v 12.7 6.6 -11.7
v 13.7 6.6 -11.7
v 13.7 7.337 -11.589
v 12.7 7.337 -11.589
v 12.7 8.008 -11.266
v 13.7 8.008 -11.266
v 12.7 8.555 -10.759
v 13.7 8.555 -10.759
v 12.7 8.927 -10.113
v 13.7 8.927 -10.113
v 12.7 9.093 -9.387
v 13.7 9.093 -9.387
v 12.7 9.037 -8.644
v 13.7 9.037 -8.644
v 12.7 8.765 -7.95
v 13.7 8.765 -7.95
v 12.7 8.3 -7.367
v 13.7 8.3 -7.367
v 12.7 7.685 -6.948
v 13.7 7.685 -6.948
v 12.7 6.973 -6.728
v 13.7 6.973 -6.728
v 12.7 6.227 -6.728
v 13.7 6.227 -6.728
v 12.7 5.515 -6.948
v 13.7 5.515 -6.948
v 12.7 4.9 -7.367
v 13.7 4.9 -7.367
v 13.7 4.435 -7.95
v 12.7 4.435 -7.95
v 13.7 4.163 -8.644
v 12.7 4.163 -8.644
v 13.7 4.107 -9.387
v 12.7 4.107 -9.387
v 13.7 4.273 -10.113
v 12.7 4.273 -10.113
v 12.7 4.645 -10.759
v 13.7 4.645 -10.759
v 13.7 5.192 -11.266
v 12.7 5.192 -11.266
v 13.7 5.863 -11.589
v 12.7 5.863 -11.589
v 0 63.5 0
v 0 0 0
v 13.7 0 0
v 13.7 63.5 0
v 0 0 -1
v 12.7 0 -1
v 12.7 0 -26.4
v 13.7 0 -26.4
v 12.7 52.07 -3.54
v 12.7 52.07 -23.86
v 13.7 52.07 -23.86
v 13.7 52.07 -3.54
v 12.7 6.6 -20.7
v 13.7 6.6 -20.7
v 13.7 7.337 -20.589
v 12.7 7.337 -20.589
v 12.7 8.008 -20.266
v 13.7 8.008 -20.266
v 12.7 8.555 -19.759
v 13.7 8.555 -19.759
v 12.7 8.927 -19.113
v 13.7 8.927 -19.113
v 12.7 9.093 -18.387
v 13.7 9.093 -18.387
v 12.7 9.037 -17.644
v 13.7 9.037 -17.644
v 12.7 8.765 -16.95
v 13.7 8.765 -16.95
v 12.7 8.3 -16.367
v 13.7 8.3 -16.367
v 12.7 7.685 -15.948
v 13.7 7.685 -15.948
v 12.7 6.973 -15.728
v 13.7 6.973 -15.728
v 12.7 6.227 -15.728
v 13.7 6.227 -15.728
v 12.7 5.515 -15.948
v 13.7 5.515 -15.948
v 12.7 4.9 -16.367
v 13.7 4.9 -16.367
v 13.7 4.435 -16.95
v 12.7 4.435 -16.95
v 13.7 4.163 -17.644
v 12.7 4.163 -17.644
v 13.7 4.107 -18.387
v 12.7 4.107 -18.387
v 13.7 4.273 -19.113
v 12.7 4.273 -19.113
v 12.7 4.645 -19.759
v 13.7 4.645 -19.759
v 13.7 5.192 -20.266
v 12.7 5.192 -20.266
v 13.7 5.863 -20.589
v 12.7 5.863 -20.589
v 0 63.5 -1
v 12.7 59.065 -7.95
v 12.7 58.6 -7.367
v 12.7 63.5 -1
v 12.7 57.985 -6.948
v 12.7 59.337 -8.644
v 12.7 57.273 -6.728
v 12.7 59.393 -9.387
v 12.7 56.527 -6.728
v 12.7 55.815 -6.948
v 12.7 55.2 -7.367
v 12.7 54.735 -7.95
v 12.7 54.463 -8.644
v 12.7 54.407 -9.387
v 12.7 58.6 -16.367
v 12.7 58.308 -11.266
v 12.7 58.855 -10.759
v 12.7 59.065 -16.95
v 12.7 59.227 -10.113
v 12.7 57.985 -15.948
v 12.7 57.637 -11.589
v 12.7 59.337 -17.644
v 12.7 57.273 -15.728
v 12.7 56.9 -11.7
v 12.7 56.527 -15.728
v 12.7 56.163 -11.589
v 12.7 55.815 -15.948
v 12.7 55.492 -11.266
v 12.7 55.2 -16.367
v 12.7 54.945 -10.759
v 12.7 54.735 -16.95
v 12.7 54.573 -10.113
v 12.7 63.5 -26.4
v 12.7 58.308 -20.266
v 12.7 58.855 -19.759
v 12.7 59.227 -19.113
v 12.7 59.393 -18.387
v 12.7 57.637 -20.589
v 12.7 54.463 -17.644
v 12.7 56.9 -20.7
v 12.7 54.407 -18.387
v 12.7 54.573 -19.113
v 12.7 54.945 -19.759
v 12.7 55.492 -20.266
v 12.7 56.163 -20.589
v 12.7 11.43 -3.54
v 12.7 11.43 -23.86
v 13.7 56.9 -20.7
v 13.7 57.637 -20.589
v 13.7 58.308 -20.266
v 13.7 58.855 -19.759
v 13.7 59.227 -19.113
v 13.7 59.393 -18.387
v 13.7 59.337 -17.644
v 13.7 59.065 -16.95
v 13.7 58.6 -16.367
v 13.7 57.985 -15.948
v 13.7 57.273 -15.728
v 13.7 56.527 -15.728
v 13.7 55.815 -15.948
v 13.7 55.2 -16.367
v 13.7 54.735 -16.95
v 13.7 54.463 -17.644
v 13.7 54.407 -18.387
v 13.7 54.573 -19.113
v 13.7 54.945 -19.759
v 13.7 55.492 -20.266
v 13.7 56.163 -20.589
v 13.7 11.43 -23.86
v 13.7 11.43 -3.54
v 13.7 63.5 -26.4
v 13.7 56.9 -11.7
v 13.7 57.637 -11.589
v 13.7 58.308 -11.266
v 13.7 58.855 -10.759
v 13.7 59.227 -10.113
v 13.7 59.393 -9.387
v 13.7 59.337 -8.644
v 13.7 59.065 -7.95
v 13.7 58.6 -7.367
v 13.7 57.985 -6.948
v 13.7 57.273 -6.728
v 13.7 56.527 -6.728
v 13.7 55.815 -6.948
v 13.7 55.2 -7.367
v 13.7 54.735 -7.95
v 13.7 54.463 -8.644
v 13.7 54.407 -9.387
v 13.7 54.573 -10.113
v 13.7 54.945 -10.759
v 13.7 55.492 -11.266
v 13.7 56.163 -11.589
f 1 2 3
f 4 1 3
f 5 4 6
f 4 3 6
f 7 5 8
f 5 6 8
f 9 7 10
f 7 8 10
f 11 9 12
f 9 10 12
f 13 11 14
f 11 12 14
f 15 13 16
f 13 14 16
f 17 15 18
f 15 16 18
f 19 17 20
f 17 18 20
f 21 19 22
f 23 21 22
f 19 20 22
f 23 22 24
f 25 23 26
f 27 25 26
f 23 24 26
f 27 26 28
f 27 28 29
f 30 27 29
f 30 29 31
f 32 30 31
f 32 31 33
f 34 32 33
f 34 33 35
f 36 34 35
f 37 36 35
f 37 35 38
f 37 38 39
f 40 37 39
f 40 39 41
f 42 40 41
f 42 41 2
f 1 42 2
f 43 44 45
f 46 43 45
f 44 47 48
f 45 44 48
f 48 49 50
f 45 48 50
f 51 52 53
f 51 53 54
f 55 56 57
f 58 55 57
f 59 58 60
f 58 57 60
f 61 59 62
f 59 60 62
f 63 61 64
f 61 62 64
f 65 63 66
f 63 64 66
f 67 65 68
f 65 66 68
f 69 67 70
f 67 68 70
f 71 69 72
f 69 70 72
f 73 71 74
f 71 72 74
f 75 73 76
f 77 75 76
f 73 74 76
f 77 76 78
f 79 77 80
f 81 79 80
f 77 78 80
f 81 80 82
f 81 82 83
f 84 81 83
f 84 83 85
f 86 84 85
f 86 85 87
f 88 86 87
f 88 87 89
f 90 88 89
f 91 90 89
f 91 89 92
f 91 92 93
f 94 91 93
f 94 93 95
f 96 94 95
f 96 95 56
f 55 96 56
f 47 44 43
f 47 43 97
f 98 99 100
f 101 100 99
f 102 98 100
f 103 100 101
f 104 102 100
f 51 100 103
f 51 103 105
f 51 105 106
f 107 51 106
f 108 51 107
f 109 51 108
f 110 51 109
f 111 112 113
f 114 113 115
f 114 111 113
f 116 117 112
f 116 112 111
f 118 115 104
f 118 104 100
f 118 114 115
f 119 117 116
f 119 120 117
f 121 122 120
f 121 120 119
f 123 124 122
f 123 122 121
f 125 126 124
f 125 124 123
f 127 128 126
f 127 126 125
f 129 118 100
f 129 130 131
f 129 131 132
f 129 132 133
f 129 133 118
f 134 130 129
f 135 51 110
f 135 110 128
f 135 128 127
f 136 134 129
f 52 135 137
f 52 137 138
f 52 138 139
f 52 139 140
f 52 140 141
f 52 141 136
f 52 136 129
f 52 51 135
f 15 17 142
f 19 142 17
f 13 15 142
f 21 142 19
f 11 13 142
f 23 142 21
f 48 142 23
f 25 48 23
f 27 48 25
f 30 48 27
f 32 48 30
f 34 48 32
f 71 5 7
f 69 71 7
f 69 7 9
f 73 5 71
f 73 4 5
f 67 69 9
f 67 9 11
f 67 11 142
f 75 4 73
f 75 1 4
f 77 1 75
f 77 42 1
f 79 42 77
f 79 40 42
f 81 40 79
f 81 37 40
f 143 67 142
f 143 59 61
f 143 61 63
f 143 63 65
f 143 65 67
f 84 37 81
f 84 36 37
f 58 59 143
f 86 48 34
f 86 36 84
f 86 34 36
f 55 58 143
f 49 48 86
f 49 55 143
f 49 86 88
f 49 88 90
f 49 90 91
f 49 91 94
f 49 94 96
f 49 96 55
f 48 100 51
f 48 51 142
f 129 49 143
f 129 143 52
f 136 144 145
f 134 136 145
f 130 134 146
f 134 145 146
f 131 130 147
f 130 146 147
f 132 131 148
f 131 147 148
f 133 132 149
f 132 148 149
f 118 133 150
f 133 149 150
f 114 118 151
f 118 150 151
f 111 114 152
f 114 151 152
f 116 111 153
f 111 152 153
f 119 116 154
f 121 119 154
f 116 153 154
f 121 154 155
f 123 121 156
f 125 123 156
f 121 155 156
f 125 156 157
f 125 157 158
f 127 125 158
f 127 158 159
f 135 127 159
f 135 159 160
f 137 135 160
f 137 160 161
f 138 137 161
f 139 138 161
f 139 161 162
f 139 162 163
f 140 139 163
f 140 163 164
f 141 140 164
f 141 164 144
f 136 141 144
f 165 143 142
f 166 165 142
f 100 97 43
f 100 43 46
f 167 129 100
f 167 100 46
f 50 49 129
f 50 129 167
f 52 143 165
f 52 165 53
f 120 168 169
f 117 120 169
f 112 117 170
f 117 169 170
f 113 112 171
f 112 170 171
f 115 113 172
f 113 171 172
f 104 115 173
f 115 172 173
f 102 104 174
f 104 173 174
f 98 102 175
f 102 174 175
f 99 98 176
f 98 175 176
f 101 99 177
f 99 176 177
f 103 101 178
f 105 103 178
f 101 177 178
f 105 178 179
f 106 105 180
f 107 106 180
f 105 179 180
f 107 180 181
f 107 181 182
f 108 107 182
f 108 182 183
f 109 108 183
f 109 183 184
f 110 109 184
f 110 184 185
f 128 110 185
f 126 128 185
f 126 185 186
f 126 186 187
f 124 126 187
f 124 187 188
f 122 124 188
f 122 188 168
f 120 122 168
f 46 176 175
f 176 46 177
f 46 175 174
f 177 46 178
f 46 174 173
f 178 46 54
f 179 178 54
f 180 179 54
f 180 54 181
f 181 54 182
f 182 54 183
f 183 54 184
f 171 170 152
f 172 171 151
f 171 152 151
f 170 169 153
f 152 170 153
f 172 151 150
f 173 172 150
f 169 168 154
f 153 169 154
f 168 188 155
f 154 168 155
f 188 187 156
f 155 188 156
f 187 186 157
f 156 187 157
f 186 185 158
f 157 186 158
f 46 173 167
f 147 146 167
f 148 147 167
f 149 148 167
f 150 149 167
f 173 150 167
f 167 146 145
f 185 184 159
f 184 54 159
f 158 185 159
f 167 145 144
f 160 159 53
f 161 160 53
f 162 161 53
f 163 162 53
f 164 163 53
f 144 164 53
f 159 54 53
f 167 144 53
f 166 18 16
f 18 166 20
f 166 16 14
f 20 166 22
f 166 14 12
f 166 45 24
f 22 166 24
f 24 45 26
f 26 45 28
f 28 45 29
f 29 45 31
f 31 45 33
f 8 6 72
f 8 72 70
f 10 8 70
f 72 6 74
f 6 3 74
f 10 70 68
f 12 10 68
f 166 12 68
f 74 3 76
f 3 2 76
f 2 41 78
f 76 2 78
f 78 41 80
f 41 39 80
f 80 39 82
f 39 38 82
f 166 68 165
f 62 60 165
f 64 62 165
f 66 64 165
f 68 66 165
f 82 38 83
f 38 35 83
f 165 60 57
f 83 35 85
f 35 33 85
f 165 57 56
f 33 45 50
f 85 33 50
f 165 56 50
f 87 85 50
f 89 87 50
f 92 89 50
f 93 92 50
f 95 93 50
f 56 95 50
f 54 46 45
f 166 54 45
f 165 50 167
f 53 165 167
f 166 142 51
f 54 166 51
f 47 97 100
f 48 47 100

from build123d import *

# Parameters (mm, degrees)
SKETCH1_W             = 1
SKETCH1_H             = 25.4
SKETCH1_W_2           = 13.7
SKETCH1_H_2           = 1
BOSS_EXTRUDE1_DEPTH   = 63.5
SKETCH2_W             = 20.32
SKETCH2_H             = 40.64
CUT_EXTRUDE1_DEPTH    = 70.932109935
F_5_0MM_DOWEL_HOLE1_D = 5


with BuildPart() as part:
    # Sketch1 → Boss-Extrude1 (new body)
    with BuildSketch(Plane(origin=(0, 0, 0), x_dir=(1, 0, 0), z_dir=(0, 1, 0))):
        with Locations((13.2, 13.7)):
            Rectangle(SKETCH1_W, SKETCH1_H)
        with Locations((6.85, 0.5)):
            Rectangle(SKETCH1_W_2, SKETCH1_H_2)
    extrude(amount=BOSS_EXTRUDE1_DEPTH)

    # Sketch2 → Cut-Extrude1 (cut, through all)
    with BuildSketch(Plane.ZY.offset(-12.7)):
        with Locations((-13.7, 31.75)):
            Rectangle(SKETCH2_W, SKETCH2_H)
    extrude(amount=-CUT_EXTRUDE1_DEPTH, mode=Mode.SUBTRACT)

    # Ø5.0mm Dowel Hole1 (through all)
    with Locations(Plane.ZY.offset(-12.7)):
        with Locations((-9.2, 6.6), (-18.2, 56.9), (-9.2, 56.9), (-18.2, 6.6)):
            Hole(F_5_0MM_DOWEL_HOLE1_D / 2)


solid = part.part
